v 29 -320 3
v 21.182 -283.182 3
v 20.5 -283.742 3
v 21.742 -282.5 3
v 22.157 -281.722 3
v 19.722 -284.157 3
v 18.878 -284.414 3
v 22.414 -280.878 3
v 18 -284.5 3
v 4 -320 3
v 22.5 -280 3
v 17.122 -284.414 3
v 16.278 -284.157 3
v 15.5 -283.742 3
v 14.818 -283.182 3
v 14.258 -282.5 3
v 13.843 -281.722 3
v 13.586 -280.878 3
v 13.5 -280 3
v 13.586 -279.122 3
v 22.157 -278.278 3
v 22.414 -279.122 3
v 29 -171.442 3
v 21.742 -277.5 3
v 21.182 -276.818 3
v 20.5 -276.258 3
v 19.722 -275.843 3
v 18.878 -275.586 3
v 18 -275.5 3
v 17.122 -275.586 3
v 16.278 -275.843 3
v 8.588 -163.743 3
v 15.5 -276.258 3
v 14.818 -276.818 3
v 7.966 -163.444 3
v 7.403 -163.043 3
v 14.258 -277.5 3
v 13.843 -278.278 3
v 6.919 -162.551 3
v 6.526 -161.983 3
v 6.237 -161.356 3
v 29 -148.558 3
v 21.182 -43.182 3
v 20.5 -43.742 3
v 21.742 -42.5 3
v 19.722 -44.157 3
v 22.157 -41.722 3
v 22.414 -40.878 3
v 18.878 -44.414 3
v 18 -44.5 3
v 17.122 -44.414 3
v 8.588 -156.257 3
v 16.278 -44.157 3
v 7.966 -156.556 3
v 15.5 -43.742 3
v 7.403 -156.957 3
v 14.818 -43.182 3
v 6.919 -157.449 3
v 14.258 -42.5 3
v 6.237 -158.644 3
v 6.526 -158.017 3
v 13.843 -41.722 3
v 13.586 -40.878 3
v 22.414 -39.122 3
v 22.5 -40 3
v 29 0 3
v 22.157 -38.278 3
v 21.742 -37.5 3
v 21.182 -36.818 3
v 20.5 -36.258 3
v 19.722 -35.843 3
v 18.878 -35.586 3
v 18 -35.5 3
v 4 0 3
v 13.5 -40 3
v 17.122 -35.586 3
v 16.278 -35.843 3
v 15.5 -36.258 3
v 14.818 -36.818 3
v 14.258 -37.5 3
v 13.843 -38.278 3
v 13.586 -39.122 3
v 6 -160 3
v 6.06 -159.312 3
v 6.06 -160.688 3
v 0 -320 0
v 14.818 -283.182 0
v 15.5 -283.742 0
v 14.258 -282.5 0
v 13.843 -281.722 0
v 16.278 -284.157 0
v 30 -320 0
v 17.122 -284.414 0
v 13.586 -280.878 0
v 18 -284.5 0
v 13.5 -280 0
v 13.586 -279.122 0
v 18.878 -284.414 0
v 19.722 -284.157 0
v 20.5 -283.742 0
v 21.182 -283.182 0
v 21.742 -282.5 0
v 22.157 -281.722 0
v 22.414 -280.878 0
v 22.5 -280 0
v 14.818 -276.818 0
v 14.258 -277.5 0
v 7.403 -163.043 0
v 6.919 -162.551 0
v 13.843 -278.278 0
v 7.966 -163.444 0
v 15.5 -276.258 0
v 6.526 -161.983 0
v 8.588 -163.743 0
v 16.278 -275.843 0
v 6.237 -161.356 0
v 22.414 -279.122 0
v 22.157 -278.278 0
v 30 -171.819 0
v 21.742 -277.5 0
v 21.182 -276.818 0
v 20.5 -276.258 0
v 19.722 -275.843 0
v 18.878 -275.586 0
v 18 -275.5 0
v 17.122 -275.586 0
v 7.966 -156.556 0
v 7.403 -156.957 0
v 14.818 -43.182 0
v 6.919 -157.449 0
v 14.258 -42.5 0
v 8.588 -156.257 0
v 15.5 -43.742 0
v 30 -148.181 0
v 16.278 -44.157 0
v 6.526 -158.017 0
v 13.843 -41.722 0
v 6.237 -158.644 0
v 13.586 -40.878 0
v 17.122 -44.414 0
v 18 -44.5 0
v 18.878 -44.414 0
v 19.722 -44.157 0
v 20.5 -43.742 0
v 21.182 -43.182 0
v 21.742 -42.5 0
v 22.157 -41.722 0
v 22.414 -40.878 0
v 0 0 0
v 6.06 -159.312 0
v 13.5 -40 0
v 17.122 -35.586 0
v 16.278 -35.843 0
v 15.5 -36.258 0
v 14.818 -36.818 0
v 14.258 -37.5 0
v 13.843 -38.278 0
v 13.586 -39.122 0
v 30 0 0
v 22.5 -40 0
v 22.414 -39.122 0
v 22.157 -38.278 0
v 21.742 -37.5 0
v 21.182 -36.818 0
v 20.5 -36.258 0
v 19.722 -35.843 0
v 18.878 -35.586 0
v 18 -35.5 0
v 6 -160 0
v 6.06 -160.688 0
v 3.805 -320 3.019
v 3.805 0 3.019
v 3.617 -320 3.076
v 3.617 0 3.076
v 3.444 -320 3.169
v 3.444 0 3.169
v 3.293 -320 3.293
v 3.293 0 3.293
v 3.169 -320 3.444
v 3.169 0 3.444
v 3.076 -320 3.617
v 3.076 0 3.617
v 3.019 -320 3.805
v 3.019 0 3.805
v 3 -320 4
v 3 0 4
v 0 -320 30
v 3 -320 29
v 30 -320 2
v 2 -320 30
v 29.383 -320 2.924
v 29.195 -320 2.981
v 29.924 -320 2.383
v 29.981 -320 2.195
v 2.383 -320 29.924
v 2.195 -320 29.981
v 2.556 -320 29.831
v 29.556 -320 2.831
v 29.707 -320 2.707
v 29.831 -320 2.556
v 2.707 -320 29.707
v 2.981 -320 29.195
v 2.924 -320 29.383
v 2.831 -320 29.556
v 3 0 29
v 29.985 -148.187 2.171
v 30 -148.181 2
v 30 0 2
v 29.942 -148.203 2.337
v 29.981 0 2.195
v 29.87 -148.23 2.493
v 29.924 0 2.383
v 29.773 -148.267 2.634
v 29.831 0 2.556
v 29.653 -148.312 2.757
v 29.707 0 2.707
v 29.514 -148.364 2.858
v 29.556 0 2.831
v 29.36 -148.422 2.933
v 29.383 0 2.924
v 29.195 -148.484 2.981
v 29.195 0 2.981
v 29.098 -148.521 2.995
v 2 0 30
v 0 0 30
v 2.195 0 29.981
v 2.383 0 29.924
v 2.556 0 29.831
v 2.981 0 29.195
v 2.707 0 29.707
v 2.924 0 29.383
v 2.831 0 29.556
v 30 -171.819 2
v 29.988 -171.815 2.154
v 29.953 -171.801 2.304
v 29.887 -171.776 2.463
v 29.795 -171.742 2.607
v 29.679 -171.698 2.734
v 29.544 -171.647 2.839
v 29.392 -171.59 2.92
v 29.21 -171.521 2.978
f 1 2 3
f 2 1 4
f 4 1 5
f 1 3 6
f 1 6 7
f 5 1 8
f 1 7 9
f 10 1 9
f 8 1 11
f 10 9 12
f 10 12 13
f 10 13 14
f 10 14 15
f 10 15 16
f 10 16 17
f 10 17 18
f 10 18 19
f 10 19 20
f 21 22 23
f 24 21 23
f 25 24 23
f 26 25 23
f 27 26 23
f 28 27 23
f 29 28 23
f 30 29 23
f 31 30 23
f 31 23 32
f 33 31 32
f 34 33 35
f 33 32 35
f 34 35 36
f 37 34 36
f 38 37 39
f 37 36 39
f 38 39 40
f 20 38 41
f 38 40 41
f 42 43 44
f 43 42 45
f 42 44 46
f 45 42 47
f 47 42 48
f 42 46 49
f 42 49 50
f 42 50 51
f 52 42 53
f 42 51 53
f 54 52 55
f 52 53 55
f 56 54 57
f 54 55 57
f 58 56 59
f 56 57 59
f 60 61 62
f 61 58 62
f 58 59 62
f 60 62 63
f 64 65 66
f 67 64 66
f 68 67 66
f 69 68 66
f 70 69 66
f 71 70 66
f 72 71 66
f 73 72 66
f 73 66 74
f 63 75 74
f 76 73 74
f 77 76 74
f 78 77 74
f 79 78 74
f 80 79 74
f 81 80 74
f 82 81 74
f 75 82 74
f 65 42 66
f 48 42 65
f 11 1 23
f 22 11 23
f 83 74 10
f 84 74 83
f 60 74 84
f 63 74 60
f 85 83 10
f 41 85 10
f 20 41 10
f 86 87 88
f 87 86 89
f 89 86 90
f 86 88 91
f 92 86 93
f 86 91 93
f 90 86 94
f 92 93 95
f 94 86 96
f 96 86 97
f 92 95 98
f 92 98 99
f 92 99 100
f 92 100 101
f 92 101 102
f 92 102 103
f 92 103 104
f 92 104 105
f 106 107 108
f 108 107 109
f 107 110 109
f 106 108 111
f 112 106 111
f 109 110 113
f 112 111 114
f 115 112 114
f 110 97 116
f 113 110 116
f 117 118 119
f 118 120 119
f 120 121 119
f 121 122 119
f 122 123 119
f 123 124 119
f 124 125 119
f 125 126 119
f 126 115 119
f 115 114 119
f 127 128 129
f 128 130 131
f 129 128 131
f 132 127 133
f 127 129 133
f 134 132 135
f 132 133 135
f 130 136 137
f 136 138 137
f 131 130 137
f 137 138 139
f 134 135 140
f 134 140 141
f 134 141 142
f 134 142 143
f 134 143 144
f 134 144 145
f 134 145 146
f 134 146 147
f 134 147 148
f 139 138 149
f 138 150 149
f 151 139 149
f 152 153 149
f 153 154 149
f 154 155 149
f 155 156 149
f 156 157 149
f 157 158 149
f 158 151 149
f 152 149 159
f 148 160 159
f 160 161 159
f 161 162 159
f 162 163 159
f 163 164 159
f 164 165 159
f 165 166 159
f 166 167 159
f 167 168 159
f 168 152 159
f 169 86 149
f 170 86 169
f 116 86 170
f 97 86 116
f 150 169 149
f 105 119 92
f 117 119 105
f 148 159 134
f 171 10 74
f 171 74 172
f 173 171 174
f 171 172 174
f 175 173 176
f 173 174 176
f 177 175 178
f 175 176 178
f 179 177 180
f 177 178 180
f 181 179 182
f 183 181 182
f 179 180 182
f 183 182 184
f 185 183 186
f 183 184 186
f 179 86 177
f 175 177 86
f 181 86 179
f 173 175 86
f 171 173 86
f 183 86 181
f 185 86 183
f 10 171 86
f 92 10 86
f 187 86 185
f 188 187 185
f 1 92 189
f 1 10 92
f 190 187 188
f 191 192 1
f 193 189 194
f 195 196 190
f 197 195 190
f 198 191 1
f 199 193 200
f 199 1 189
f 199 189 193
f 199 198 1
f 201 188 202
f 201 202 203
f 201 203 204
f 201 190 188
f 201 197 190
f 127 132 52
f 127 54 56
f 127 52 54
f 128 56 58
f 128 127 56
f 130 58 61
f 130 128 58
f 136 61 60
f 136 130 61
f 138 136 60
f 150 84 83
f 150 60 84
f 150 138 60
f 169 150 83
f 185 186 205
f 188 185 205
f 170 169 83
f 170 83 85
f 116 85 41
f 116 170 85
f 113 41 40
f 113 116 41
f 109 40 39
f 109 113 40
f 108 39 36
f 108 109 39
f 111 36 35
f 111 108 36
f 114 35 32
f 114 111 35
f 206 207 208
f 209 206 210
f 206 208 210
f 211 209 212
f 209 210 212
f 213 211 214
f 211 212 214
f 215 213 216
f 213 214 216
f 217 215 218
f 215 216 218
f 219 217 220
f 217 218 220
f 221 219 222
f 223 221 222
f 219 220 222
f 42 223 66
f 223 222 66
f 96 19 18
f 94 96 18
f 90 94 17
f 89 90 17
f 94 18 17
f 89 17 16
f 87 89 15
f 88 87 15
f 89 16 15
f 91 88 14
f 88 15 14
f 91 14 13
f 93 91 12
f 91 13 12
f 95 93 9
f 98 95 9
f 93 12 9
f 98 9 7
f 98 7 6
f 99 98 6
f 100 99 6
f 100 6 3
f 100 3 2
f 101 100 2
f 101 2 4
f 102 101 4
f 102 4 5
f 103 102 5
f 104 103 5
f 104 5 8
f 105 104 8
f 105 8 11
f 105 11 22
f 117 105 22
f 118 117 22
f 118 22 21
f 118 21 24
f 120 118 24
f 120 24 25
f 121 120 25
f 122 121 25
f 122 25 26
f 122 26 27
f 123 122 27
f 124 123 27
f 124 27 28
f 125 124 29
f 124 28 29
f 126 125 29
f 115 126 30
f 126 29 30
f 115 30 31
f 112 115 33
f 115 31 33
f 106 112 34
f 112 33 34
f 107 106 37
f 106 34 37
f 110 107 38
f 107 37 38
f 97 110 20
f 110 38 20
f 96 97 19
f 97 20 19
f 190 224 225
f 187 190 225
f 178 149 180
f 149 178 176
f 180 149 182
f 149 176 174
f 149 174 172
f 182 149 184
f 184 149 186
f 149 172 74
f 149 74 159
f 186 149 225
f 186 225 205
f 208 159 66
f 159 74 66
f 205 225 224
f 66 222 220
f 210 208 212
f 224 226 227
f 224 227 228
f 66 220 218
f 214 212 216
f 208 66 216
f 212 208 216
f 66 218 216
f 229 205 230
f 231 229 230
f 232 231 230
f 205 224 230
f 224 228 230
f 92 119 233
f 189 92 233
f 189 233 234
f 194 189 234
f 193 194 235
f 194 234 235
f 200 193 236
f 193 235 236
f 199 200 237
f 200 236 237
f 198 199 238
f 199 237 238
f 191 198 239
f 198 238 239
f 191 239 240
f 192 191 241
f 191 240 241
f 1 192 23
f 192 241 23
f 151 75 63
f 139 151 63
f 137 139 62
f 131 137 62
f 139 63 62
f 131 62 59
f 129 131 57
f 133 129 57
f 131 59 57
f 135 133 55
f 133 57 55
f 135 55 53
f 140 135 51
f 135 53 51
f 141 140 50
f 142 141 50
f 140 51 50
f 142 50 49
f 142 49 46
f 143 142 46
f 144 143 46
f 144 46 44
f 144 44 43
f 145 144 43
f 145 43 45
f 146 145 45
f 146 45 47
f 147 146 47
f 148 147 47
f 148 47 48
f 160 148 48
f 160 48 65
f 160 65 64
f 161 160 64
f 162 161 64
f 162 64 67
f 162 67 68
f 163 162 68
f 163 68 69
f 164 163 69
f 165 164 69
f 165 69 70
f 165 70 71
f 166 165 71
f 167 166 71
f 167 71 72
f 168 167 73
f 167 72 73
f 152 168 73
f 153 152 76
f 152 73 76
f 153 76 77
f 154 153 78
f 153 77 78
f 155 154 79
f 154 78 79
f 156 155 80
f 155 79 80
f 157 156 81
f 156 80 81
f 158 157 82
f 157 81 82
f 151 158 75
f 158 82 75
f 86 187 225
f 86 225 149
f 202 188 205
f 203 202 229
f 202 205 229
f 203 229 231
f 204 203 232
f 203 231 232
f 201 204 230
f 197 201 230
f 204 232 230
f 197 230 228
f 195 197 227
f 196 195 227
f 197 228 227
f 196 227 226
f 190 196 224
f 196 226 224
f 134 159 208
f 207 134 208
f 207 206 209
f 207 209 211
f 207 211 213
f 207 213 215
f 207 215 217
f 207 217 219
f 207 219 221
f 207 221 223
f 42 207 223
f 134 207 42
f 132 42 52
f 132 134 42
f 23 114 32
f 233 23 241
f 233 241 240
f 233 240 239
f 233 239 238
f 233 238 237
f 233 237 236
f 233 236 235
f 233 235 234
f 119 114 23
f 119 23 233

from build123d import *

# Parameters (mm, degrees)
F1_DEPTH = 320
F3_DEPTH = 30
F4_D     = 9


with BuildPart() as f1:
    # F0 (on Front) → F1 (new body)
    with BuildSketch(Plane.XZ):
        with BuildLine():
            Line((0, 30), (0, 0))
            Line((0, 0), (30, 0))
            Line((30, 0), (30, 2))
            ThreePointArc((30, 2), (29.7071067812, 2.7071067812), (29, 3))
            Line((29, 3), (4, 3))
            ThreePointArc((4, 3), (3.2928932188, 3.2928932188), (3, 4))
            Line((3, 4), (3, 29))
            ThreePointArc((3, 29), (2.7071067812, 29.7071067812), (2, 30))
            Line((2, 30), (0, 30))
        make_face()
    extrude(amount=F1_DEPTH)

    # F2 (on Top) → F3 (cut, through all)
    with BuildSketch(Plane.XY):
        with BuildLine():
            Line((30, -148.180951785), (8.5882981113, -156.257394253))
            ThreePointArc((8.5882981113, -156.257394253), (6.7101058106, -157.7247865545), (6, -160))
            ThreePointArc((6, -160), (6.7101058106, -162.2752134455), (8.5882981113, -163.742605747))
            Line((8.5882981113, -163.742605747), (30, -171.819048215))
            Line((30, -171.819048215), (30, -160))
            Line((30, -160), (30, -148.180951785))
        make_face()
    extrude(amount=F3_DEPTH, mode=Mode.SUBTRACT)

    # F4 (through all)
    with Locations(Plane(origin=(0, 0, 0), x_dir=(1, 0, 0), z_dir=(0, 0, -1))):
        with Locations((18, 40), (18, 280)):
            Hole(F4_D / 2)


solid = f1.part
